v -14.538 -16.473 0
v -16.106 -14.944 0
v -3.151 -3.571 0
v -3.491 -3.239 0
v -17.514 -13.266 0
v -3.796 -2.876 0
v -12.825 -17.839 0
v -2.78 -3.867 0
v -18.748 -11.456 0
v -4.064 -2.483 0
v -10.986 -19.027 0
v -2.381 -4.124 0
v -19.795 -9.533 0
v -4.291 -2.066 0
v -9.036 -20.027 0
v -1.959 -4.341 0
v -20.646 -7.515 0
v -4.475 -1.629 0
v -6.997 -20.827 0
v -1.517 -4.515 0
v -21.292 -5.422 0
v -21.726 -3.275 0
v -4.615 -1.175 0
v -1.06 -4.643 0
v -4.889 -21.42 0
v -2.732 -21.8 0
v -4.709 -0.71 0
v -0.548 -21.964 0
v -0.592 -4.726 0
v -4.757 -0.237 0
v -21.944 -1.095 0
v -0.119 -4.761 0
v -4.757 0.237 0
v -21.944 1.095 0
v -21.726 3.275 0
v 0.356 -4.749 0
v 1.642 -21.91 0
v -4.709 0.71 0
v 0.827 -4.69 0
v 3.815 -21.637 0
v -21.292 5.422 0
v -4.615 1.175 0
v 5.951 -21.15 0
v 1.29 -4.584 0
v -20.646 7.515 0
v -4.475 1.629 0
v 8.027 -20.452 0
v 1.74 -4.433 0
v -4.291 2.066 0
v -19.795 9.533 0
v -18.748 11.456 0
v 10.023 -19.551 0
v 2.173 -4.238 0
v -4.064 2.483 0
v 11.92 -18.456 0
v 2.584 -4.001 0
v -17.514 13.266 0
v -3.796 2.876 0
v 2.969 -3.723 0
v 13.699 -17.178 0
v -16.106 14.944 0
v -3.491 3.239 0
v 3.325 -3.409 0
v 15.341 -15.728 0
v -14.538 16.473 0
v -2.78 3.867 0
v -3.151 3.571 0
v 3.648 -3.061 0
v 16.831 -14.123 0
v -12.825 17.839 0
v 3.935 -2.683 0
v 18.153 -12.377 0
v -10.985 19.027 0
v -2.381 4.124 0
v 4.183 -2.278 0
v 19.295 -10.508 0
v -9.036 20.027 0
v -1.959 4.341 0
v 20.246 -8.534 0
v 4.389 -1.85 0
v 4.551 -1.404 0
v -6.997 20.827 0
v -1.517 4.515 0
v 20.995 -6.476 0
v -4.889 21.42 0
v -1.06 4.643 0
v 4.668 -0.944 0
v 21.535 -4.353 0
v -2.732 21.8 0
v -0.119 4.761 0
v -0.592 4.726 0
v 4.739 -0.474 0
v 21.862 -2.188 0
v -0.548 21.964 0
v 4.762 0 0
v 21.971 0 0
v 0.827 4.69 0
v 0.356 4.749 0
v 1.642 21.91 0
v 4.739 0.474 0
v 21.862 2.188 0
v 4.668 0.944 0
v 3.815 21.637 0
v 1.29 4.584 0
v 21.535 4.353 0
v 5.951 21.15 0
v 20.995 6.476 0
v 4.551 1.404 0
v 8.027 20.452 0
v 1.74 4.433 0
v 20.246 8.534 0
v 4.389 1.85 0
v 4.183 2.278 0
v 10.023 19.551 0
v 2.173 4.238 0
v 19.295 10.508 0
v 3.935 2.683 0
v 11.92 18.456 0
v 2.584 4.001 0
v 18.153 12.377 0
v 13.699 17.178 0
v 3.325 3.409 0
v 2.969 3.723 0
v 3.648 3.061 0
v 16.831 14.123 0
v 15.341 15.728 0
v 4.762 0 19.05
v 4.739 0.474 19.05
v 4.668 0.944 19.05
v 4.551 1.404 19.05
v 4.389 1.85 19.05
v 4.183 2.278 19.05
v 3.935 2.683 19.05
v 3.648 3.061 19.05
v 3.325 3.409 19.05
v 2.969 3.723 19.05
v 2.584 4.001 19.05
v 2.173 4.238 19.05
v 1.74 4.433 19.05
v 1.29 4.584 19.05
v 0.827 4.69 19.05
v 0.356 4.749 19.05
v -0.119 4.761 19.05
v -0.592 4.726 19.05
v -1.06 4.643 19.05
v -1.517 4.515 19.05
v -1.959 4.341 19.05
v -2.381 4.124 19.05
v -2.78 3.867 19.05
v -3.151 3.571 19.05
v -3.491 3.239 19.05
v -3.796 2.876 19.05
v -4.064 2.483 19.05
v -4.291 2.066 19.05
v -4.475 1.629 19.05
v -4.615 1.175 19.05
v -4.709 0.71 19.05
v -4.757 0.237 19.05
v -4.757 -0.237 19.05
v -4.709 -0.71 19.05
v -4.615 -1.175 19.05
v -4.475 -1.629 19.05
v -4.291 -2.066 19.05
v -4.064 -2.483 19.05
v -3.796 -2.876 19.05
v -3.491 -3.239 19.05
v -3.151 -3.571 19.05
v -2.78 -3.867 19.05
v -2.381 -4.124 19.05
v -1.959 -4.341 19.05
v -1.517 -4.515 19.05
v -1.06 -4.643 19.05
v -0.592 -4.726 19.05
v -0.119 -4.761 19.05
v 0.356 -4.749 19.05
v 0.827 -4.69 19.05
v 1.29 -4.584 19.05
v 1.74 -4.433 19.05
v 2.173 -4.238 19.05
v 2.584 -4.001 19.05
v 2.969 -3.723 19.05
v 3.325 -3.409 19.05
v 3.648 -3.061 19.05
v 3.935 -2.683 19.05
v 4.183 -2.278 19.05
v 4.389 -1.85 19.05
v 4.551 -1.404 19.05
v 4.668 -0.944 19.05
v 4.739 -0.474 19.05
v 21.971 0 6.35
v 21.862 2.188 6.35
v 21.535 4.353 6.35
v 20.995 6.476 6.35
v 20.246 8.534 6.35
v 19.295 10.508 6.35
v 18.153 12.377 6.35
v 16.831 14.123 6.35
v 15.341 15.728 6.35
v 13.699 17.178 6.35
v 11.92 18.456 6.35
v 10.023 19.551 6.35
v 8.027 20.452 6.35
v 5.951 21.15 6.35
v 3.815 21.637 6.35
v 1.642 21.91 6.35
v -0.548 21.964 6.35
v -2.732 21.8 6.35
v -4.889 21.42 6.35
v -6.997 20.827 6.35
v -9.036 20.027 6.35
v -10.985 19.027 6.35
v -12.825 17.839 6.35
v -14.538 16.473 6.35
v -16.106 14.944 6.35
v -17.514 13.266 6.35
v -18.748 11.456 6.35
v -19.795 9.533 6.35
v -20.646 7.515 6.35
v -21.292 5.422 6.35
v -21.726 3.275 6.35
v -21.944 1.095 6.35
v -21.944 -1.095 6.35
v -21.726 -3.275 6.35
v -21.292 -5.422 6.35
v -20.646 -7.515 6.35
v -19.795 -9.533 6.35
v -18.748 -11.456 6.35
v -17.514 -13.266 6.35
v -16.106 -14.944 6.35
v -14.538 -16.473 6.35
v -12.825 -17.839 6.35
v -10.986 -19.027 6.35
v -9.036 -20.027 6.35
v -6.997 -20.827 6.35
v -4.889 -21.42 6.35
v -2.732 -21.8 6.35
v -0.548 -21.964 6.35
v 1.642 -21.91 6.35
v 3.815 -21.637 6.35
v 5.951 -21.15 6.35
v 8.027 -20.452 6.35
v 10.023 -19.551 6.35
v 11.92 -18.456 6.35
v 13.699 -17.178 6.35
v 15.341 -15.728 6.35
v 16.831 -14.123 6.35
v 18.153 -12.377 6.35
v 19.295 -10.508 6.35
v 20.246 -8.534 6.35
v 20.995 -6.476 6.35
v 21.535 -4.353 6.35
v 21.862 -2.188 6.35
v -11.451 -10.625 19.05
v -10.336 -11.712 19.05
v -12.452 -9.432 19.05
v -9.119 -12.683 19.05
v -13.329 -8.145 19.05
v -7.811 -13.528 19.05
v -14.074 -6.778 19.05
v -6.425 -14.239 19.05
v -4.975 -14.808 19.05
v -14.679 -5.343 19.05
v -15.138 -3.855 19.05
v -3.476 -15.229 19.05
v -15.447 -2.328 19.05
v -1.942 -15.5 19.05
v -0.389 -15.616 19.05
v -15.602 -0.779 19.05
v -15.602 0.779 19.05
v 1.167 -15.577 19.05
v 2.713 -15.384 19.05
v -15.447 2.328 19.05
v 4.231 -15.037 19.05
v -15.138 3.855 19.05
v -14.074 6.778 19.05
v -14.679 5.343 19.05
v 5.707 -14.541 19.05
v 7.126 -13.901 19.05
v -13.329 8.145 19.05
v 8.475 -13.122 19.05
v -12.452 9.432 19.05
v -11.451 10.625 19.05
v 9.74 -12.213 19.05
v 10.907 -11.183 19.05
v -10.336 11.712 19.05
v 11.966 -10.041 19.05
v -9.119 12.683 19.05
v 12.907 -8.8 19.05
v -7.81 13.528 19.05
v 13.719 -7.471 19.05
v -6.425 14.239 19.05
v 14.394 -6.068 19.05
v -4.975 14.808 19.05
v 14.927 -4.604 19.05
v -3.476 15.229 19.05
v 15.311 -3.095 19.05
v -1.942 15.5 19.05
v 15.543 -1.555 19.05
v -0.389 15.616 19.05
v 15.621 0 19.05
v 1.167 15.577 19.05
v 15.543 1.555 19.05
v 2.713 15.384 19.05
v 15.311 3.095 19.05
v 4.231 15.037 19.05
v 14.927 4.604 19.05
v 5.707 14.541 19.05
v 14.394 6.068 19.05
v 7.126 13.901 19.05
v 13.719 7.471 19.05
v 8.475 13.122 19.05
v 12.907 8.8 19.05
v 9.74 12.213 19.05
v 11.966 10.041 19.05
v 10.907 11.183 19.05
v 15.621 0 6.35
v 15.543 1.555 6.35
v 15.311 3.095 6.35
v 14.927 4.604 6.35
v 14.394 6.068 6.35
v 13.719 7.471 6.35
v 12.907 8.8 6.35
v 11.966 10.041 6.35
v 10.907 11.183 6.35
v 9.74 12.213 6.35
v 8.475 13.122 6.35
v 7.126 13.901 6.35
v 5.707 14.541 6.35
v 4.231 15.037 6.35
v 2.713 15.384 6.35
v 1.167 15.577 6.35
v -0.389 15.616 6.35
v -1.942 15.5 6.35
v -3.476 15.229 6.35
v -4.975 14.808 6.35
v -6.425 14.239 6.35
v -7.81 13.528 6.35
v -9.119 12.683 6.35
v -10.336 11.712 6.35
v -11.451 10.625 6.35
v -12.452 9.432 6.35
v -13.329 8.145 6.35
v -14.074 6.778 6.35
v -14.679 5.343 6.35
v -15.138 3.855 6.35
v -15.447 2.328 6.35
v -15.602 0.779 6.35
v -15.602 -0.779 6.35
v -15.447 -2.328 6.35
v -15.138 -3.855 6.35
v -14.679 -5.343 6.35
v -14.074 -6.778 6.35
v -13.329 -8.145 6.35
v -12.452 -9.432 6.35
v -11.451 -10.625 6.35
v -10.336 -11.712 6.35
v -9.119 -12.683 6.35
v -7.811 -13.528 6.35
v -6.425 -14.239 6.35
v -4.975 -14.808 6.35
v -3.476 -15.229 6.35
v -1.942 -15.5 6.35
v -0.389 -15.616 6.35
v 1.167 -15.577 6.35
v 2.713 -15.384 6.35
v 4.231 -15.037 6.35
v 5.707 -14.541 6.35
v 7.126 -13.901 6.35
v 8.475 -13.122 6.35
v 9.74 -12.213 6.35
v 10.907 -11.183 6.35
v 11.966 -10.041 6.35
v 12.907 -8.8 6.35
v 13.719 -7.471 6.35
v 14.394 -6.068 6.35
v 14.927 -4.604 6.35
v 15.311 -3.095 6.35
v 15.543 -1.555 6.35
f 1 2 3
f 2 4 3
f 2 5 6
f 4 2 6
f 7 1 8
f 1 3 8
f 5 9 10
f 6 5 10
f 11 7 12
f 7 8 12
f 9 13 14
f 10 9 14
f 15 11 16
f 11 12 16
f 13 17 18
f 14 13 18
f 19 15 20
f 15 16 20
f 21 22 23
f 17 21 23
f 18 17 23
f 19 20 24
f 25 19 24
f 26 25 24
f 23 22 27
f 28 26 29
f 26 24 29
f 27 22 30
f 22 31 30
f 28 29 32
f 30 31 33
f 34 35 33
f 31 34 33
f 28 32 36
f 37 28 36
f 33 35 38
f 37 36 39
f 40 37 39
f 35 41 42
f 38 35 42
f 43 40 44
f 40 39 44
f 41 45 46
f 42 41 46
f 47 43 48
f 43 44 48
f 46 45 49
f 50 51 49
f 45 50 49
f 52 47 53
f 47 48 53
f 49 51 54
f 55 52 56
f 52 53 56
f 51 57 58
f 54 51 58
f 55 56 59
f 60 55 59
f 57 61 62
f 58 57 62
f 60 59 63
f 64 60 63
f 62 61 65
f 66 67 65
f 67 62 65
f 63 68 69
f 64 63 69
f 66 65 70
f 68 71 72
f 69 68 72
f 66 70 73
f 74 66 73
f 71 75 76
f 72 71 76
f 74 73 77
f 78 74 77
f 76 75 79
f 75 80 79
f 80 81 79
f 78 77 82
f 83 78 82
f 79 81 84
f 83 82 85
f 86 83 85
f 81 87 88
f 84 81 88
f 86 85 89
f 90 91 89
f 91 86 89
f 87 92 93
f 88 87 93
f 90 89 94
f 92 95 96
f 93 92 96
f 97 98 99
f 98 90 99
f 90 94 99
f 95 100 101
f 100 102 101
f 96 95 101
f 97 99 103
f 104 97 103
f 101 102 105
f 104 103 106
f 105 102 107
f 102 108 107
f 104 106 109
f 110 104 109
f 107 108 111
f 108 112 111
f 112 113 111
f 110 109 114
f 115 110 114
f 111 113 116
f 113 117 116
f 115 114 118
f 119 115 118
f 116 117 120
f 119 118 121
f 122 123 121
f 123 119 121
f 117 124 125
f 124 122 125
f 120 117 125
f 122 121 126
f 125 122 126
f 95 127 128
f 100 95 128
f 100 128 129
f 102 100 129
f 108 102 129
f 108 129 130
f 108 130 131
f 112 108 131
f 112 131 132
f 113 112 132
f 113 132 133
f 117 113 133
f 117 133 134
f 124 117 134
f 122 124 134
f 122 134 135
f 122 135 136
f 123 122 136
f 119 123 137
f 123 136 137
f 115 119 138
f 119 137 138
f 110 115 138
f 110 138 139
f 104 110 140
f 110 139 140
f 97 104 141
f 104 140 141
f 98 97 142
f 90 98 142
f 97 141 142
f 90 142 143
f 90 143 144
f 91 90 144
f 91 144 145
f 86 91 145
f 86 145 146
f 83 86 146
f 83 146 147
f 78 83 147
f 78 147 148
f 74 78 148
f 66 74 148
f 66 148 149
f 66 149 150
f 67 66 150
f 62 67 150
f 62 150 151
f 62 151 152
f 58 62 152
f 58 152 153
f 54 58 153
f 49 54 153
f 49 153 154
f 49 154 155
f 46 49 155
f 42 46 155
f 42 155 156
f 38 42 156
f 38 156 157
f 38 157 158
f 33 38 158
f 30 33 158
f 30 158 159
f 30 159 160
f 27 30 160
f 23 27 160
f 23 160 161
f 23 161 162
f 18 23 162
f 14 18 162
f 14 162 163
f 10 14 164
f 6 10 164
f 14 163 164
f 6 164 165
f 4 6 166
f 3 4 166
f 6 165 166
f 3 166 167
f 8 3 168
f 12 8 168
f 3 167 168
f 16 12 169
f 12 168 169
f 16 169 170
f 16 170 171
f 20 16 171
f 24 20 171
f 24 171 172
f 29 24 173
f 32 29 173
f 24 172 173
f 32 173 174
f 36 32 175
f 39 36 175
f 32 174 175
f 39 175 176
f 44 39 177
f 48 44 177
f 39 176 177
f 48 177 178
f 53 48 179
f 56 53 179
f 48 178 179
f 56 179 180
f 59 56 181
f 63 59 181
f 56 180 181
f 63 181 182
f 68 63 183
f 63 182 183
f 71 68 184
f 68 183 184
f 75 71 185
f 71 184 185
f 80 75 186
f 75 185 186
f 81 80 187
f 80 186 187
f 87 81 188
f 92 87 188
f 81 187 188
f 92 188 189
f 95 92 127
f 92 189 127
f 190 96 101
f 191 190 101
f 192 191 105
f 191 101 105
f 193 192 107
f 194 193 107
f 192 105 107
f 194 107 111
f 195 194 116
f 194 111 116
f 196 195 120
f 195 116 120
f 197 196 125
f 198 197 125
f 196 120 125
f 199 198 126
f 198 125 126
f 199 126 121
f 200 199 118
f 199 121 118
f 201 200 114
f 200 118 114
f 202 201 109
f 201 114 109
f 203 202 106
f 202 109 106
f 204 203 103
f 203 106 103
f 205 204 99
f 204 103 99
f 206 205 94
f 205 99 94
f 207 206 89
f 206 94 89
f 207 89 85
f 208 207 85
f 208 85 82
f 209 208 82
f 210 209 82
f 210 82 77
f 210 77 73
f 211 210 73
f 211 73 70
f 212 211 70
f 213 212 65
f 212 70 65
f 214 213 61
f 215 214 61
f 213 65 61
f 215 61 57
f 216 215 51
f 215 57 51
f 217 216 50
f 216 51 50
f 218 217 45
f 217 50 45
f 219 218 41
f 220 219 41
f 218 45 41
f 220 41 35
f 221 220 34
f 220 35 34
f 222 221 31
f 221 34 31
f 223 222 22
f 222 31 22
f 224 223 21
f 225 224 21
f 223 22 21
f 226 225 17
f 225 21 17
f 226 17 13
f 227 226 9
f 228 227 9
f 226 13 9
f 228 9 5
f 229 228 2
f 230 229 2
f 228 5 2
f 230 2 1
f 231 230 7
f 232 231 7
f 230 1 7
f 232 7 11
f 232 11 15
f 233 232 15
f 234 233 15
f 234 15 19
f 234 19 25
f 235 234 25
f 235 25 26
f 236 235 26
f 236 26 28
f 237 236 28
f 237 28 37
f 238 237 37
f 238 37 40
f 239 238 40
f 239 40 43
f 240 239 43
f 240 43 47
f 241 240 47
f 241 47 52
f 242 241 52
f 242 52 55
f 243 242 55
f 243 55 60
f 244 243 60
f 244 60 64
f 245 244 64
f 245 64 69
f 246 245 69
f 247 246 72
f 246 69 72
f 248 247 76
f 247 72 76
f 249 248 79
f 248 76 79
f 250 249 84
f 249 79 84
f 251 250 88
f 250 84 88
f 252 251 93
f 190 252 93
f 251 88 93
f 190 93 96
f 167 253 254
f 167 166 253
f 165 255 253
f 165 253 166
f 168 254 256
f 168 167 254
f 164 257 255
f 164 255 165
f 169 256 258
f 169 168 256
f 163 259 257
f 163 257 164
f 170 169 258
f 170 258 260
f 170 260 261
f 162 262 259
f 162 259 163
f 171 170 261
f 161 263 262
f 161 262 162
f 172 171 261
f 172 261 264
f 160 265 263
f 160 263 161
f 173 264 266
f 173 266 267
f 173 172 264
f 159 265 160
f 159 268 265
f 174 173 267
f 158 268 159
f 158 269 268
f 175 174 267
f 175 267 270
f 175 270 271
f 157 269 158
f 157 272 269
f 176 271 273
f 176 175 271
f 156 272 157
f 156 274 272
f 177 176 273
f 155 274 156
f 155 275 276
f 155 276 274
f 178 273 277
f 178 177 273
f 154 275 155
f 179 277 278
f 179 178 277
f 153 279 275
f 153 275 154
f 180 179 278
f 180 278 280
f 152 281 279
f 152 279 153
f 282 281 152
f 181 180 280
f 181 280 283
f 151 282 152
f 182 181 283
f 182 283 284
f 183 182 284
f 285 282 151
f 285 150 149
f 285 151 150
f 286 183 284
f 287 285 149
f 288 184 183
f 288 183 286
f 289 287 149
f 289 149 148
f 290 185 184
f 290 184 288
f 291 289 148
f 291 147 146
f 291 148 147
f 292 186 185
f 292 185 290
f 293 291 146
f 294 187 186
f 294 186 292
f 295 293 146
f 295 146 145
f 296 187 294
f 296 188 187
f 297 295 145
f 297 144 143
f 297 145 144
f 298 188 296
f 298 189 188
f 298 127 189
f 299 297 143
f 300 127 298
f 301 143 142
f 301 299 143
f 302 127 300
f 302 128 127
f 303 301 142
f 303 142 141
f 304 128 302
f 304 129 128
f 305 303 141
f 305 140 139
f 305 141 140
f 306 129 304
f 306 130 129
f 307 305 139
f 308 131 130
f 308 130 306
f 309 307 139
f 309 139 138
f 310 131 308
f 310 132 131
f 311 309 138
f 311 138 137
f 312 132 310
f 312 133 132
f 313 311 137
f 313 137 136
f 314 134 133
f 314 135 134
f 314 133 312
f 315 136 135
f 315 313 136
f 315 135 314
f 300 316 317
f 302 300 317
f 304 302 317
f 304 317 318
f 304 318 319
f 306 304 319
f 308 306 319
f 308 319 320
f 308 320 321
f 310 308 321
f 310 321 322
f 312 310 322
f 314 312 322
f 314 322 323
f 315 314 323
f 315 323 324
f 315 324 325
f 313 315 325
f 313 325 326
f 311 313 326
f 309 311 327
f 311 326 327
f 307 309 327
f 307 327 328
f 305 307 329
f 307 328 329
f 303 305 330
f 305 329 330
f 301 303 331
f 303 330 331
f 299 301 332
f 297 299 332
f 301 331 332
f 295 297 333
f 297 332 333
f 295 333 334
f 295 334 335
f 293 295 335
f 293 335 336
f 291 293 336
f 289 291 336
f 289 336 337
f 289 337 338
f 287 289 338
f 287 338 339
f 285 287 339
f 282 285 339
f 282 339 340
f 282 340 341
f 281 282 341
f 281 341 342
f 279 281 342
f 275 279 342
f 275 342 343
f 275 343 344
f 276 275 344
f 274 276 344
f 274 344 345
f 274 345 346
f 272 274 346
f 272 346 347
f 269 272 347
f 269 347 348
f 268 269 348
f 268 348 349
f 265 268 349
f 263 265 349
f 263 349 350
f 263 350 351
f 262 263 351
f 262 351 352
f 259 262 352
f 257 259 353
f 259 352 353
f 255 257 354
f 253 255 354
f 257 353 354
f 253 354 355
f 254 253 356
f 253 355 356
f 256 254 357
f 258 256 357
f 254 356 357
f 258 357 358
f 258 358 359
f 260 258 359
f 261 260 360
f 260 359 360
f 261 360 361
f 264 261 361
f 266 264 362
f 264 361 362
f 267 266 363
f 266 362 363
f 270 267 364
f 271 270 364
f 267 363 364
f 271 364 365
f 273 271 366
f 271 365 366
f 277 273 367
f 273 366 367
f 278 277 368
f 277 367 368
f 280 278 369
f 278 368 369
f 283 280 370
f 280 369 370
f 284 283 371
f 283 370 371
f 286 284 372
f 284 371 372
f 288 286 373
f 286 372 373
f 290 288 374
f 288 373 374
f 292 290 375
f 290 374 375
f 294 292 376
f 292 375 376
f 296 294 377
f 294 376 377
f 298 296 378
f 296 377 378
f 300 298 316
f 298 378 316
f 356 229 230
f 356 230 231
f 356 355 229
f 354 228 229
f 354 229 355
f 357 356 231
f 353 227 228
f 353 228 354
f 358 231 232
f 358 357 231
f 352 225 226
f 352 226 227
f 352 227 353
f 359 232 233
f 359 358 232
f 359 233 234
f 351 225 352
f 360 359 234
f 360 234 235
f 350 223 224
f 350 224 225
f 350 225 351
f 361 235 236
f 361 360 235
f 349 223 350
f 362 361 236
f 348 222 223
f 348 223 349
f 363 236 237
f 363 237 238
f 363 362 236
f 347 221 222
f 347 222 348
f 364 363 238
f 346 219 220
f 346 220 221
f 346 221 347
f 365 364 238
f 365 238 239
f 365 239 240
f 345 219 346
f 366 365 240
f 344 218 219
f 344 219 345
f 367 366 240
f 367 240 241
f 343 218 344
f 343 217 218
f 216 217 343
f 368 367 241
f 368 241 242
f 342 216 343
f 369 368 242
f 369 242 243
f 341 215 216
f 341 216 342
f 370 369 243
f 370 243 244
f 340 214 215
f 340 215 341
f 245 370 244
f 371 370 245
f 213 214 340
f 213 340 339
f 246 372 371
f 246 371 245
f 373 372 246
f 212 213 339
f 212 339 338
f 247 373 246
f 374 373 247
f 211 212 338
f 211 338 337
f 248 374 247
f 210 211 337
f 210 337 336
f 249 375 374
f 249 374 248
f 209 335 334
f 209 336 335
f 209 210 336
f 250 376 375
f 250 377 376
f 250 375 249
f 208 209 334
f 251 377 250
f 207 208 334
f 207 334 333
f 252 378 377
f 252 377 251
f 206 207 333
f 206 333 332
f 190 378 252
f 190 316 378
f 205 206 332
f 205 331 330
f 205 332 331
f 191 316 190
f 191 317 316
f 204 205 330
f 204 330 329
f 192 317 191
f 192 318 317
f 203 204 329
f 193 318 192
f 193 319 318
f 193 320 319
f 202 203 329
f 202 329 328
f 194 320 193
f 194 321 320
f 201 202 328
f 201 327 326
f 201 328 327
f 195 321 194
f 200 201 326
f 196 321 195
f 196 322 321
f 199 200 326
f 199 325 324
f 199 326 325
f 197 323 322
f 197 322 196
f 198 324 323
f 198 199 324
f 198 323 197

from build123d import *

# Parameters (mm, degrees)
F0_R     = 21.971
F0_R_2   = 15.621
F1_DEPTH = 6.35
F2_DEPTH = 19.05
F3_R     = 4.7625
F4_DEPTH = 19.051


with BuildPart() as f1:
    # F0 (on Top) → F1 (new body)
    with BuildSketch(Plane.XY):
        Circle(F0_R)
        Circle(F0_R_2, mode=Mode.SUBTRACT)
    extrude(amount=F1_DEPTH)

    # F0 (on Top) → F2 (join)
    with BuildSketch(Plane.XY):
        Circle(F0_R_2)
    extrude(amount=F2_DEPTH)

    # F3 (on face) → F4 (cut, through all)
    with BuildSketch(Plane.XY.offset(19.05)):
        Circle(F3_R)
    extrude(amount=-F4_DEPTH, mode=Mode.SUBTRACT)


solid = f1.part
